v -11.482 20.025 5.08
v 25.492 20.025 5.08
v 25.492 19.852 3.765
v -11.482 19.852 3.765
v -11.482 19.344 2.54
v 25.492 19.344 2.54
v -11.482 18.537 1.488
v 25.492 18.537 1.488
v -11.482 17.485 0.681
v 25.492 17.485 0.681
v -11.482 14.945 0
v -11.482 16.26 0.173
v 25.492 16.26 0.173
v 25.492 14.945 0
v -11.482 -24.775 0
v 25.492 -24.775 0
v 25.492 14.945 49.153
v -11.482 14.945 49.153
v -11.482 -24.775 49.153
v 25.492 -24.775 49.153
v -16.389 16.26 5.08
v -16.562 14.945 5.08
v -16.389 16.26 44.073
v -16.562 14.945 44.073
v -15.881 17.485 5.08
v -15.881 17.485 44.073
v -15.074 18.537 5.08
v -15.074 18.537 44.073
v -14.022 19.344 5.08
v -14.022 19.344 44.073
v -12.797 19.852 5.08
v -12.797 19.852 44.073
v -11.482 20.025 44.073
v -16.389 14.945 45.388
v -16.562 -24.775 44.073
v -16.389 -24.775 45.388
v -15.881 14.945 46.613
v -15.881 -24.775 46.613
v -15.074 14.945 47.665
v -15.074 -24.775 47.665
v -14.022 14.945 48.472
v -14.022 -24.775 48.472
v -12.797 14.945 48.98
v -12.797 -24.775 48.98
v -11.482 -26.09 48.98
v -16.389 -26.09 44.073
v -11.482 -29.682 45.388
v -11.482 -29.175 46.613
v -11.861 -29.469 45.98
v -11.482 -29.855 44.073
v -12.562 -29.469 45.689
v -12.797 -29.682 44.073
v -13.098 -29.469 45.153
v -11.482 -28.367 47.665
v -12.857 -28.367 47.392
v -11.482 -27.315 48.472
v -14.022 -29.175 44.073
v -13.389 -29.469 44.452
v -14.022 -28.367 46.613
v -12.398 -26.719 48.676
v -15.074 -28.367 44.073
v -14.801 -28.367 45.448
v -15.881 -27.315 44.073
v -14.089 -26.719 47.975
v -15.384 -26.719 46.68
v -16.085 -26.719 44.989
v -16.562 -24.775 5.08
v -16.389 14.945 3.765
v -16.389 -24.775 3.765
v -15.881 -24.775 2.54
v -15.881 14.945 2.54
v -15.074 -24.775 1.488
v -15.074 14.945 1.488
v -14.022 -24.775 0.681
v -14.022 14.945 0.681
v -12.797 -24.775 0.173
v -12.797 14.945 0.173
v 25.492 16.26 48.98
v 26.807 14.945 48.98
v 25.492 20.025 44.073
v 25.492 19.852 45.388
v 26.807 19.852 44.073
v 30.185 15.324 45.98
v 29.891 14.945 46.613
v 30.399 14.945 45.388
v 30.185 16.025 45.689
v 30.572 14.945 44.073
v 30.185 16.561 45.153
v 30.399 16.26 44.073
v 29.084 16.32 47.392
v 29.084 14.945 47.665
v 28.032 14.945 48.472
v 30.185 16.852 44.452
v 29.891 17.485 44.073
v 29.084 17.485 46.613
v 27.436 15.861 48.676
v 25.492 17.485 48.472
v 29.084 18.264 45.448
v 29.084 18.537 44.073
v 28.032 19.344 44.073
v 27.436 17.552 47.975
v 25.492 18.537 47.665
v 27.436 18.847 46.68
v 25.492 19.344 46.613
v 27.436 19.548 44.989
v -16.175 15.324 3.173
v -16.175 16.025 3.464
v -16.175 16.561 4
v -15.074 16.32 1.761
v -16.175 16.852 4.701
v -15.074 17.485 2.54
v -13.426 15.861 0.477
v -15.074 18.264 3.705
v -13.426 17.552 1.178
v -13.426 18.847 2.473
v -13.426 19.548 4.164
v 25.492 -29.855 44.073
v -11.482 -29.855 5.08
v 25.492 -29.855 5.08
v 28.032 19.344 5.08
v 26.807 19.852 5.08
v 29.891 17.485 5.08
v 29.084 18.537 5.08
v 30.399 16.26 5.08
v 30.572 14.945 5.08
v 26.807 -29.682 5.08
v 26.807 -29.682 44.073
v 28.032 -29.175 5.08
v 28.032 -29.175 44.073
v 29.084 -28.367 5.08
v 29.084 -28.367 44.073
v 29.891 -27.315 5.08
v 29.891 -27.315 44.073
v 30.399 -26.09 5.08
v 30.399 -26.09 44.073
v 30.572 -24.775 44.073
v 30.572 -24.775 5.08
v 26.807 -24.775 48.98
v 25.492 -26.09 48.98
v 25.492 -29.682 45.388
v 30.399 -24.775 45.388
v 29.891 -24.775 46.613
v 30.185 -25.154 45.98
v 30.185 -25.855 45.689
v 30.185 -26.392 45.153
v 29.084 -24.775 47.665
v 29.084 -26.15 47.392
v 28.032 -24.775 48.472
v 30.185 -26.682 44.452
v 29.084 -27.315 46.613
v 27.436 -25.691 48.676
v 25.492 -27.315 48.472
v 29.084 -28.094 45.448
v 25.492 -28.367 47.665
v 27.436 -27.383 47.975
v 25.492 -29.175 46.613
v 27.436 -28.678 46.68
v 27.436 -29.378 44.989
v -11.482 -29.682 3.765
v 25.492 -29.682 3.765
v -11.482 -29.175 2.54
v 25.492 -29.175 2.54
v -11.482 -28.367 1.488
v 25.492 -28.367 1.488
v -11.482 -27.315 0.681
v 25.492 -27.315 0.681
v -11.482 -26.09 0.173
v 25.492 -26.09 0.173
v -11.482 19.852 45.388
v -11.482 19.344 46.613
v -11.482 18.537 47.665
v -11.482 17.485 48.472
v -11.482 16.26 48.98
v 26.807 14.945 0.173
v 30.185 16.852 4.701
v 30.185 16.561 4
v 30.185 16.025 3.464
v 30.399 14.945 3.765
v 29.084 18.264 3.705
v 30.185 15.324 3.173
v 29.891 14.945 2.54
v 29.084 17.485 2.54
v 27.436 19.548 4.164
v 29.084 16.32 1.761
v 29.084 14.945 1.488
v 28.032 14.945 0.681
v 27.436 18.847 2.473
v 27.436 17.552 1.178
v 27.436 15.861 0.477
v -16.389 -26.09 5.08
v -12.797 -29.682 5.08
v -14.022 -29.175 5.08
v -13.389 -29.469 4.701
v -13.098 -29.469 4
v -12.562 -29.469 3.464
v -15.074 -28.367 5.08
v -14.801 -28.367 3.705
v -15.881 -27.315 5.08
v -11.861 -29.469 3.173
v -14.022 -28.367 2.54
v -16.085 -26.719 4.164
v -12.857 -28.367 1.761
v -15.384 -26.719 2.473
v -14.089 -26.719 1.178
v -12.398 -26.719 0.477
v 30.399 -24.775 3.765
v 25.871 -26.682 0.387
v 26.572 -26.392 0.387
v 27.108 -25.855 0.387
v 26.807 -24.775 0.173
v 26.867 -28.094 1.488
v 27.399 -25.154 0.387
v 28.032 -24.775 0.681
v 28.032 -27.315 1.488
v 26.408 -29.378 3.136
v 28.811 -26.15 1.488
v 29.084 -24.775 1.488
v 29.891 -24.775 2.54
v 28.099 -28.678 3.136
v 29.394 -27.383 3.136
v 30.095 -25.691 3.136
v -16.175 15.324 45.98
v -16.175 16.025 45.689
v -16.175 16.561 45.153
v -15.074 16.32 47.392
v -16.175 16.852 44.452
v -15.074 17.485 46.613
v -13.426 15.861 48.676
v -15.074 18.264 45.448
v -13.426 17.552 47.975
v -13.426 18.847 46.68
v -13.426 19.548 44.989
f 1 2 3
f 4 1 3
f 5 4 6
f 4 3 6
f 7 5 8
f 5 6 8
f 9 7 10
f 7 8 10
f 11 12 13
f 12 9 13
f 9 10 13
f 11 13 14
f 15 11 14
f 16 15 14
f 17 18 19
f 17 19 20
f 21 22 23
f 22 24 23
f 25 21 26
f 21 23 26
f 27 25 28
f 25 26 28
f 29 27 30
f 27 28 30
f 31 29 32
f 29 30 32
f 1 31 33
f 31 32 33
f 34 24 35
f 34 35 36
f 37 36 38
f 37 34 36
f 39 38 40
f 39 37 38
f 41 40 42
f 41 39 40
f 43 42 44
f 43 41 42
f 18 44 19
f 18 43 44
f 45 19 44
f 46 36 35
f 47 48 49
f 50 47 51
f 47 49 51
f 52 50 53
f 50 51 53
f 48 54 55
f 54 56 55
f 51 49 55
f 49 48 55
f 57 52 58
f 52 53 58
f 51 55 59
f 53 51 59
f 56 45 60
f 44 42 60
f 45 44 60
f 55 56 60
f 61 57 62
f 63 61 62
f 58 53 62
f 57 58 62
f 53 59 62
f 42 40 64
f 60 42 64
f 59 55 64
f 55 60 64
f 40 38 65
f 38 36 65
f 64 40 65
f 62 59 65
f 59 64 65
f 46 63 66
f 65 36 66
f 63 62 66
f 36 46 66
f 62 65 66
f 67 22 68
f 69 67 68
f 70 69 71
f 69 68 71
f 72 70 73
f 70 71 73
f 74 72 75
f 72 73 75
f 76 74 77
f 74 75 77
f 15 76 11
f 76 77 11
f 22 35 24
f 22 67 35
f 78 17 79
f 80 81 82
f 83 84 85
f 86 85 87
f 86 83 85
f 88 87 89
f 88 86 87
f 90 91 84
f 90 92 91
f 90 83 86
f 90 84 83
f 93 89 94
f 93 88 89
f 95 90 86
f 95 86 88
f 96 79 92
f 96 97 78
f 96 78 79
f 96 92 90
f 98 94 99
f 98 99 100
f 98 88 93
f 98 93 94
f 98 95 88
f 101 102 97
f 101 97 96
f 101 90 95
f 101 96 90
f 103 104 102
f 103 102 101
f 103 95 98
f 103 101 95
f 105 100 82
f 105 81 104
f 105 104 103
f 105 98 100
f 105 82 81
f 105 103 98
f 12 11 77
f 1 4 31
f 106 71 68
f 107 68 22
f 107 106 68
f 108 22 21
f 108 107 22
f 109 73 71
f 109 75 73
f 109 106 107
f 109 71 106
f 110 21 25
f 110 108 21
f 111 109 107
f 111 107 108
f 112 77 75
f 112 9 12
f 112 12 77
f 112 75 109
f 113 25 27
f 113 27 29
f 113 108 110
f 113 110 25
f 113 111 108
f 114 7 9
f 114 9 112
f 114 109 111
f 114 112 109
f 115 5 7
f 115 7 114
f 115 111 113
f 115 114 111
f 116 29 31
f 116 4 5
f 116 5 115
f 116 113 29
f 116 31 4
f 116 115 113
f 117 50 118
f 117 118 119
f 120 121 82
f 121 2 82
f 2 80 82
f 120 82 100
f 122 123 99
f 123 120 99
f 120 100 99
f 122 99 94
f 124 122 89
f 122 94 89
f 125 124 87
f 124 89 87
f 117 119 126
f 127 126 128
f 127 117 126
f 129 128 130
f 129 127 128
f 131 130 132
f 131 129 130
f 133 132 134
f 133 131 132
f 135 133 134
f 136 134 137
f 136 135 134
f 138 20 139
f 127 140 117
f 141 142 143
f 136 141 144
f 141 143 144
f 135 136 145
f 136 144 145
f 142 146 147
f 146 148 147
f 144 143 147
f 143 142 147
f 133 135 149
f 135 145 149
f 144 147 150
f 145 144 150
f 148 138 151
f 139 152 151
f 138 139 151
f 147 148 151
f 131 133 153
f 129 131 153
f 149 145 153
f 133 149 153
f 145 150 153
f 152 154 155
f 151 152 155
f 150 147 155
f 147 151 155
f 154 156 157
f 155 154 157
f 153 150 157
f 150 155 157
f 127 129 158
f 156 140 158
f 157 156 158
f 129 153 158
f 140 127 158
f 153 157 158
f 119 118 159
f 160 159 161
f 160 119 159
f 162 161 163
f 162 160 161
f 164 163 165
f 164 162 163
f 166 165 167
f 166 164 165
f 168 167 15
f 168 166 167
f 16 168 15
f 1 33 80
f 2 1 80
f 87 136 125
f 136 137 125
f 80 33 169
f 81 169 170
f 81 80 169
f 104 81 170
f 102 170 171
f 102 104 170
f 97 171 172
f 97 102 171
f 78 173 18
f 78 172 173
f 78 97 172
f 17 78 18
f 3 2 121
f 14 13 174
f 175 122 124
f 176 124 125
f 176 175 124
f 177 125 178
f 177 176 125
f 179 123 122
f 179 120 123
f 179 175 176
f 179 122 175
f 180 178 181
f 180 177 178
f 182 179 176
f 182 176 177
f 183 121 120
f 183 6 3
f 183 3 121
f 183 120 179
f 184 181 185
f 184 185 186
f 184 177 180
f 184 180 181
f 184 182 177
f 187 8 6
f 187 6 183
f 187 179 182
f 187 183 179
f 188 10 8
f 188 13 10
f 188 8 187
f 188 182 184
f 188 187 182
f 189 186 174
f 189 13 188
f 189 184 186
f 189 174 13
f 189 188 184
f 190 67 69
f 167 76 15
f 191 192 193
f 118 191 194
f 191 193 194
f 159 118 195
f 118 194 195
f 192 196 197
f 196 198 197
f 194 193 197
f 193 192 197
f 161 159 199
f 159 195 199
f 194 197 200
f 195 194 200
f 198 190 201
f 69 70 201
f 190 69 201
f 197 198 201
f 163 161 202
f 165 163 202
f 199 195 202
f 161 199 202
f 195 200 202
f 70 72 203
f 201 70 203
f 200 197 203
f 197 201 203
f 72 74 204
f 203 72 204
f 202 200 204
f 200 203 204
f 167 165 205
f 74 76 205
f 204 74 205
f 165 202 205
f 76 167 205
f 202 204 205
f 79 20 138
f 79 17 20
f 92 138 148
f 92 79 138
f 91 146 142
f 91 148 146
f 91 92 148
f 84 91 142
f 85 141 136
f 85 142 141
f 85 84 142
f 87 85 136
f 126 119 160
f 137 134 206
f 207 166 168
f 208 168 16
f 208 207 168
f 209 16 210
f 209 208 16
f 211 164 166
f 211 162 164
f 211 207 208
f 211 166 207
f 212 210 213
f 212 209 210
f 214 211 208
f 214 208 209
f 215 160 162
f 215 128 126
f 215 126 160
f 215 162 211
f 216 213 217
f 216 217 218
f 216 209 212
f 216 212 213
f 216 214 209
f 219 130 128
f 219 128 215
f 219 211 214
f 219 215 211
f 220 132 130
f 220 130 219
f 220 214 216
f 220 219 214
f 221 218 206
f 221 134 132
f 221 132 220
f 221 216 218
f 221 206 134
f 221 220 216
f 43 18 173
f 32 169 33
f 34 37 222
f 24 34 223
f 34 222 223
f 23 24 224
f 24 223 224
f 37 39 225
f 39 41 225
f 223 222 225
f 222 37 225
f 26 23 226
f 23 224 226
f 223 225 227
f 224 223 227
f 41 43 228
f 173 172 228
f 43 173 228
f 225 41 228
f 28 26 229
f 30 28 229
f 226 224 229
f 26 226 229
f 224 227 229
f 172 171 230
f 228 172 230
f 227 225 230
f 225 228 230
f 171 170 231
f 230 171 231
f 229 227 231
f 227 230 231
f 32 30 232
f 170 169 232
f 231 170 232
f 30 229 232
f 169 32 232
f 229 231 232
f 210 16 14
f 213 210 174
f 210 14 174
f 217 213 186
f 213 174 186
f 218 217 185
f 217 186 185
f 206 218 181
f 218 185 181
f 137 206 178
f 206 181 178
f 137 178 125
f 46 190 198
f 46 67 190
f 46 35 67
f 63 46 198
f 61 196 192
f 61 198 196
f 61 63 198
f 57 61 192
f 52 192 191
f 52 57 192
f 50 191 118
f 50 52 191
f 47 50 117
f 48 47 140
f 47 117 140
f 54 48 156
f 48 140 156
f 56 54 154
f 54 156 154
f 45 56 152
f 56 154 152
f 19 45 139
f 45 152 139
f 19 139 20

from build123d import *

# Parameters (mm, degrees)
F0_W       = 47.1339412034
F0_H       = 49.880169332
F1_DEPTH   = 49.1529554129
F1_FACE_W  = 47.1339412034
F1_FACE_H  = 49.880169332
F1_FACE1_W = 47.1339412034
F1_FACE1_H = 49.880169332
F3_R       = 5.08


with BuildPart() as f1:
    # F0 (on Top) → F1 (new body)
    with BuildSketch(Plane.XY):
        with Locations((7.0049632341, -4.9151517451)):
            Rectangle(F0_W, F0_H)
    extrude(amount=F1_DEPTH)

    # F1_face (on face) → F2 section 0
    with BuildSketch(Plane(origin=(7.0049632341, -4.9151517451, 0), x_dir=(1, 0, 0), z_dir=(0, 0, -1))):
        Rectangle(F1_FACE_W, F1_FACE_H)
    # F1_face1 (on face) → F2 section 1
    with BuildSketch(Plane(origin=(7.0049632341, -4.9151517451, 49.1529554129), x_dir=(1, 0, 0), z_dir=(0, 0, 1))):
        Rectangle(F1_FACE1_W, F1_FACE1_H)
    loft()

    # F3
    f3_edges = [f1.edges().sort_by_distance(p)[0] for p in [
        (7.004963, 20.024933, 49.152955),
        (-16.562007, -4.915152, 49.152955),
        (7.004963, 20.024933, 0),
        (-16.562007, -4.915152, 0),
        (-16.562007, 20.024933, 24.576478),
        (7.004963, -29.855236, 49.152955),
        (30.571934, -4.915152, 49.152955),
        (-16.562007, -29.855236, 24.576478),
        (30.571934, -29.855236, 24.576478),
        (7.004963, -29.855236, 0),
        (30.571934, 20.024933, 24.576478),
        (30.571934, -4.915152, 0),
    ]]
    fillet(f3_edges, radius=F3_R)


solid = f1.part
